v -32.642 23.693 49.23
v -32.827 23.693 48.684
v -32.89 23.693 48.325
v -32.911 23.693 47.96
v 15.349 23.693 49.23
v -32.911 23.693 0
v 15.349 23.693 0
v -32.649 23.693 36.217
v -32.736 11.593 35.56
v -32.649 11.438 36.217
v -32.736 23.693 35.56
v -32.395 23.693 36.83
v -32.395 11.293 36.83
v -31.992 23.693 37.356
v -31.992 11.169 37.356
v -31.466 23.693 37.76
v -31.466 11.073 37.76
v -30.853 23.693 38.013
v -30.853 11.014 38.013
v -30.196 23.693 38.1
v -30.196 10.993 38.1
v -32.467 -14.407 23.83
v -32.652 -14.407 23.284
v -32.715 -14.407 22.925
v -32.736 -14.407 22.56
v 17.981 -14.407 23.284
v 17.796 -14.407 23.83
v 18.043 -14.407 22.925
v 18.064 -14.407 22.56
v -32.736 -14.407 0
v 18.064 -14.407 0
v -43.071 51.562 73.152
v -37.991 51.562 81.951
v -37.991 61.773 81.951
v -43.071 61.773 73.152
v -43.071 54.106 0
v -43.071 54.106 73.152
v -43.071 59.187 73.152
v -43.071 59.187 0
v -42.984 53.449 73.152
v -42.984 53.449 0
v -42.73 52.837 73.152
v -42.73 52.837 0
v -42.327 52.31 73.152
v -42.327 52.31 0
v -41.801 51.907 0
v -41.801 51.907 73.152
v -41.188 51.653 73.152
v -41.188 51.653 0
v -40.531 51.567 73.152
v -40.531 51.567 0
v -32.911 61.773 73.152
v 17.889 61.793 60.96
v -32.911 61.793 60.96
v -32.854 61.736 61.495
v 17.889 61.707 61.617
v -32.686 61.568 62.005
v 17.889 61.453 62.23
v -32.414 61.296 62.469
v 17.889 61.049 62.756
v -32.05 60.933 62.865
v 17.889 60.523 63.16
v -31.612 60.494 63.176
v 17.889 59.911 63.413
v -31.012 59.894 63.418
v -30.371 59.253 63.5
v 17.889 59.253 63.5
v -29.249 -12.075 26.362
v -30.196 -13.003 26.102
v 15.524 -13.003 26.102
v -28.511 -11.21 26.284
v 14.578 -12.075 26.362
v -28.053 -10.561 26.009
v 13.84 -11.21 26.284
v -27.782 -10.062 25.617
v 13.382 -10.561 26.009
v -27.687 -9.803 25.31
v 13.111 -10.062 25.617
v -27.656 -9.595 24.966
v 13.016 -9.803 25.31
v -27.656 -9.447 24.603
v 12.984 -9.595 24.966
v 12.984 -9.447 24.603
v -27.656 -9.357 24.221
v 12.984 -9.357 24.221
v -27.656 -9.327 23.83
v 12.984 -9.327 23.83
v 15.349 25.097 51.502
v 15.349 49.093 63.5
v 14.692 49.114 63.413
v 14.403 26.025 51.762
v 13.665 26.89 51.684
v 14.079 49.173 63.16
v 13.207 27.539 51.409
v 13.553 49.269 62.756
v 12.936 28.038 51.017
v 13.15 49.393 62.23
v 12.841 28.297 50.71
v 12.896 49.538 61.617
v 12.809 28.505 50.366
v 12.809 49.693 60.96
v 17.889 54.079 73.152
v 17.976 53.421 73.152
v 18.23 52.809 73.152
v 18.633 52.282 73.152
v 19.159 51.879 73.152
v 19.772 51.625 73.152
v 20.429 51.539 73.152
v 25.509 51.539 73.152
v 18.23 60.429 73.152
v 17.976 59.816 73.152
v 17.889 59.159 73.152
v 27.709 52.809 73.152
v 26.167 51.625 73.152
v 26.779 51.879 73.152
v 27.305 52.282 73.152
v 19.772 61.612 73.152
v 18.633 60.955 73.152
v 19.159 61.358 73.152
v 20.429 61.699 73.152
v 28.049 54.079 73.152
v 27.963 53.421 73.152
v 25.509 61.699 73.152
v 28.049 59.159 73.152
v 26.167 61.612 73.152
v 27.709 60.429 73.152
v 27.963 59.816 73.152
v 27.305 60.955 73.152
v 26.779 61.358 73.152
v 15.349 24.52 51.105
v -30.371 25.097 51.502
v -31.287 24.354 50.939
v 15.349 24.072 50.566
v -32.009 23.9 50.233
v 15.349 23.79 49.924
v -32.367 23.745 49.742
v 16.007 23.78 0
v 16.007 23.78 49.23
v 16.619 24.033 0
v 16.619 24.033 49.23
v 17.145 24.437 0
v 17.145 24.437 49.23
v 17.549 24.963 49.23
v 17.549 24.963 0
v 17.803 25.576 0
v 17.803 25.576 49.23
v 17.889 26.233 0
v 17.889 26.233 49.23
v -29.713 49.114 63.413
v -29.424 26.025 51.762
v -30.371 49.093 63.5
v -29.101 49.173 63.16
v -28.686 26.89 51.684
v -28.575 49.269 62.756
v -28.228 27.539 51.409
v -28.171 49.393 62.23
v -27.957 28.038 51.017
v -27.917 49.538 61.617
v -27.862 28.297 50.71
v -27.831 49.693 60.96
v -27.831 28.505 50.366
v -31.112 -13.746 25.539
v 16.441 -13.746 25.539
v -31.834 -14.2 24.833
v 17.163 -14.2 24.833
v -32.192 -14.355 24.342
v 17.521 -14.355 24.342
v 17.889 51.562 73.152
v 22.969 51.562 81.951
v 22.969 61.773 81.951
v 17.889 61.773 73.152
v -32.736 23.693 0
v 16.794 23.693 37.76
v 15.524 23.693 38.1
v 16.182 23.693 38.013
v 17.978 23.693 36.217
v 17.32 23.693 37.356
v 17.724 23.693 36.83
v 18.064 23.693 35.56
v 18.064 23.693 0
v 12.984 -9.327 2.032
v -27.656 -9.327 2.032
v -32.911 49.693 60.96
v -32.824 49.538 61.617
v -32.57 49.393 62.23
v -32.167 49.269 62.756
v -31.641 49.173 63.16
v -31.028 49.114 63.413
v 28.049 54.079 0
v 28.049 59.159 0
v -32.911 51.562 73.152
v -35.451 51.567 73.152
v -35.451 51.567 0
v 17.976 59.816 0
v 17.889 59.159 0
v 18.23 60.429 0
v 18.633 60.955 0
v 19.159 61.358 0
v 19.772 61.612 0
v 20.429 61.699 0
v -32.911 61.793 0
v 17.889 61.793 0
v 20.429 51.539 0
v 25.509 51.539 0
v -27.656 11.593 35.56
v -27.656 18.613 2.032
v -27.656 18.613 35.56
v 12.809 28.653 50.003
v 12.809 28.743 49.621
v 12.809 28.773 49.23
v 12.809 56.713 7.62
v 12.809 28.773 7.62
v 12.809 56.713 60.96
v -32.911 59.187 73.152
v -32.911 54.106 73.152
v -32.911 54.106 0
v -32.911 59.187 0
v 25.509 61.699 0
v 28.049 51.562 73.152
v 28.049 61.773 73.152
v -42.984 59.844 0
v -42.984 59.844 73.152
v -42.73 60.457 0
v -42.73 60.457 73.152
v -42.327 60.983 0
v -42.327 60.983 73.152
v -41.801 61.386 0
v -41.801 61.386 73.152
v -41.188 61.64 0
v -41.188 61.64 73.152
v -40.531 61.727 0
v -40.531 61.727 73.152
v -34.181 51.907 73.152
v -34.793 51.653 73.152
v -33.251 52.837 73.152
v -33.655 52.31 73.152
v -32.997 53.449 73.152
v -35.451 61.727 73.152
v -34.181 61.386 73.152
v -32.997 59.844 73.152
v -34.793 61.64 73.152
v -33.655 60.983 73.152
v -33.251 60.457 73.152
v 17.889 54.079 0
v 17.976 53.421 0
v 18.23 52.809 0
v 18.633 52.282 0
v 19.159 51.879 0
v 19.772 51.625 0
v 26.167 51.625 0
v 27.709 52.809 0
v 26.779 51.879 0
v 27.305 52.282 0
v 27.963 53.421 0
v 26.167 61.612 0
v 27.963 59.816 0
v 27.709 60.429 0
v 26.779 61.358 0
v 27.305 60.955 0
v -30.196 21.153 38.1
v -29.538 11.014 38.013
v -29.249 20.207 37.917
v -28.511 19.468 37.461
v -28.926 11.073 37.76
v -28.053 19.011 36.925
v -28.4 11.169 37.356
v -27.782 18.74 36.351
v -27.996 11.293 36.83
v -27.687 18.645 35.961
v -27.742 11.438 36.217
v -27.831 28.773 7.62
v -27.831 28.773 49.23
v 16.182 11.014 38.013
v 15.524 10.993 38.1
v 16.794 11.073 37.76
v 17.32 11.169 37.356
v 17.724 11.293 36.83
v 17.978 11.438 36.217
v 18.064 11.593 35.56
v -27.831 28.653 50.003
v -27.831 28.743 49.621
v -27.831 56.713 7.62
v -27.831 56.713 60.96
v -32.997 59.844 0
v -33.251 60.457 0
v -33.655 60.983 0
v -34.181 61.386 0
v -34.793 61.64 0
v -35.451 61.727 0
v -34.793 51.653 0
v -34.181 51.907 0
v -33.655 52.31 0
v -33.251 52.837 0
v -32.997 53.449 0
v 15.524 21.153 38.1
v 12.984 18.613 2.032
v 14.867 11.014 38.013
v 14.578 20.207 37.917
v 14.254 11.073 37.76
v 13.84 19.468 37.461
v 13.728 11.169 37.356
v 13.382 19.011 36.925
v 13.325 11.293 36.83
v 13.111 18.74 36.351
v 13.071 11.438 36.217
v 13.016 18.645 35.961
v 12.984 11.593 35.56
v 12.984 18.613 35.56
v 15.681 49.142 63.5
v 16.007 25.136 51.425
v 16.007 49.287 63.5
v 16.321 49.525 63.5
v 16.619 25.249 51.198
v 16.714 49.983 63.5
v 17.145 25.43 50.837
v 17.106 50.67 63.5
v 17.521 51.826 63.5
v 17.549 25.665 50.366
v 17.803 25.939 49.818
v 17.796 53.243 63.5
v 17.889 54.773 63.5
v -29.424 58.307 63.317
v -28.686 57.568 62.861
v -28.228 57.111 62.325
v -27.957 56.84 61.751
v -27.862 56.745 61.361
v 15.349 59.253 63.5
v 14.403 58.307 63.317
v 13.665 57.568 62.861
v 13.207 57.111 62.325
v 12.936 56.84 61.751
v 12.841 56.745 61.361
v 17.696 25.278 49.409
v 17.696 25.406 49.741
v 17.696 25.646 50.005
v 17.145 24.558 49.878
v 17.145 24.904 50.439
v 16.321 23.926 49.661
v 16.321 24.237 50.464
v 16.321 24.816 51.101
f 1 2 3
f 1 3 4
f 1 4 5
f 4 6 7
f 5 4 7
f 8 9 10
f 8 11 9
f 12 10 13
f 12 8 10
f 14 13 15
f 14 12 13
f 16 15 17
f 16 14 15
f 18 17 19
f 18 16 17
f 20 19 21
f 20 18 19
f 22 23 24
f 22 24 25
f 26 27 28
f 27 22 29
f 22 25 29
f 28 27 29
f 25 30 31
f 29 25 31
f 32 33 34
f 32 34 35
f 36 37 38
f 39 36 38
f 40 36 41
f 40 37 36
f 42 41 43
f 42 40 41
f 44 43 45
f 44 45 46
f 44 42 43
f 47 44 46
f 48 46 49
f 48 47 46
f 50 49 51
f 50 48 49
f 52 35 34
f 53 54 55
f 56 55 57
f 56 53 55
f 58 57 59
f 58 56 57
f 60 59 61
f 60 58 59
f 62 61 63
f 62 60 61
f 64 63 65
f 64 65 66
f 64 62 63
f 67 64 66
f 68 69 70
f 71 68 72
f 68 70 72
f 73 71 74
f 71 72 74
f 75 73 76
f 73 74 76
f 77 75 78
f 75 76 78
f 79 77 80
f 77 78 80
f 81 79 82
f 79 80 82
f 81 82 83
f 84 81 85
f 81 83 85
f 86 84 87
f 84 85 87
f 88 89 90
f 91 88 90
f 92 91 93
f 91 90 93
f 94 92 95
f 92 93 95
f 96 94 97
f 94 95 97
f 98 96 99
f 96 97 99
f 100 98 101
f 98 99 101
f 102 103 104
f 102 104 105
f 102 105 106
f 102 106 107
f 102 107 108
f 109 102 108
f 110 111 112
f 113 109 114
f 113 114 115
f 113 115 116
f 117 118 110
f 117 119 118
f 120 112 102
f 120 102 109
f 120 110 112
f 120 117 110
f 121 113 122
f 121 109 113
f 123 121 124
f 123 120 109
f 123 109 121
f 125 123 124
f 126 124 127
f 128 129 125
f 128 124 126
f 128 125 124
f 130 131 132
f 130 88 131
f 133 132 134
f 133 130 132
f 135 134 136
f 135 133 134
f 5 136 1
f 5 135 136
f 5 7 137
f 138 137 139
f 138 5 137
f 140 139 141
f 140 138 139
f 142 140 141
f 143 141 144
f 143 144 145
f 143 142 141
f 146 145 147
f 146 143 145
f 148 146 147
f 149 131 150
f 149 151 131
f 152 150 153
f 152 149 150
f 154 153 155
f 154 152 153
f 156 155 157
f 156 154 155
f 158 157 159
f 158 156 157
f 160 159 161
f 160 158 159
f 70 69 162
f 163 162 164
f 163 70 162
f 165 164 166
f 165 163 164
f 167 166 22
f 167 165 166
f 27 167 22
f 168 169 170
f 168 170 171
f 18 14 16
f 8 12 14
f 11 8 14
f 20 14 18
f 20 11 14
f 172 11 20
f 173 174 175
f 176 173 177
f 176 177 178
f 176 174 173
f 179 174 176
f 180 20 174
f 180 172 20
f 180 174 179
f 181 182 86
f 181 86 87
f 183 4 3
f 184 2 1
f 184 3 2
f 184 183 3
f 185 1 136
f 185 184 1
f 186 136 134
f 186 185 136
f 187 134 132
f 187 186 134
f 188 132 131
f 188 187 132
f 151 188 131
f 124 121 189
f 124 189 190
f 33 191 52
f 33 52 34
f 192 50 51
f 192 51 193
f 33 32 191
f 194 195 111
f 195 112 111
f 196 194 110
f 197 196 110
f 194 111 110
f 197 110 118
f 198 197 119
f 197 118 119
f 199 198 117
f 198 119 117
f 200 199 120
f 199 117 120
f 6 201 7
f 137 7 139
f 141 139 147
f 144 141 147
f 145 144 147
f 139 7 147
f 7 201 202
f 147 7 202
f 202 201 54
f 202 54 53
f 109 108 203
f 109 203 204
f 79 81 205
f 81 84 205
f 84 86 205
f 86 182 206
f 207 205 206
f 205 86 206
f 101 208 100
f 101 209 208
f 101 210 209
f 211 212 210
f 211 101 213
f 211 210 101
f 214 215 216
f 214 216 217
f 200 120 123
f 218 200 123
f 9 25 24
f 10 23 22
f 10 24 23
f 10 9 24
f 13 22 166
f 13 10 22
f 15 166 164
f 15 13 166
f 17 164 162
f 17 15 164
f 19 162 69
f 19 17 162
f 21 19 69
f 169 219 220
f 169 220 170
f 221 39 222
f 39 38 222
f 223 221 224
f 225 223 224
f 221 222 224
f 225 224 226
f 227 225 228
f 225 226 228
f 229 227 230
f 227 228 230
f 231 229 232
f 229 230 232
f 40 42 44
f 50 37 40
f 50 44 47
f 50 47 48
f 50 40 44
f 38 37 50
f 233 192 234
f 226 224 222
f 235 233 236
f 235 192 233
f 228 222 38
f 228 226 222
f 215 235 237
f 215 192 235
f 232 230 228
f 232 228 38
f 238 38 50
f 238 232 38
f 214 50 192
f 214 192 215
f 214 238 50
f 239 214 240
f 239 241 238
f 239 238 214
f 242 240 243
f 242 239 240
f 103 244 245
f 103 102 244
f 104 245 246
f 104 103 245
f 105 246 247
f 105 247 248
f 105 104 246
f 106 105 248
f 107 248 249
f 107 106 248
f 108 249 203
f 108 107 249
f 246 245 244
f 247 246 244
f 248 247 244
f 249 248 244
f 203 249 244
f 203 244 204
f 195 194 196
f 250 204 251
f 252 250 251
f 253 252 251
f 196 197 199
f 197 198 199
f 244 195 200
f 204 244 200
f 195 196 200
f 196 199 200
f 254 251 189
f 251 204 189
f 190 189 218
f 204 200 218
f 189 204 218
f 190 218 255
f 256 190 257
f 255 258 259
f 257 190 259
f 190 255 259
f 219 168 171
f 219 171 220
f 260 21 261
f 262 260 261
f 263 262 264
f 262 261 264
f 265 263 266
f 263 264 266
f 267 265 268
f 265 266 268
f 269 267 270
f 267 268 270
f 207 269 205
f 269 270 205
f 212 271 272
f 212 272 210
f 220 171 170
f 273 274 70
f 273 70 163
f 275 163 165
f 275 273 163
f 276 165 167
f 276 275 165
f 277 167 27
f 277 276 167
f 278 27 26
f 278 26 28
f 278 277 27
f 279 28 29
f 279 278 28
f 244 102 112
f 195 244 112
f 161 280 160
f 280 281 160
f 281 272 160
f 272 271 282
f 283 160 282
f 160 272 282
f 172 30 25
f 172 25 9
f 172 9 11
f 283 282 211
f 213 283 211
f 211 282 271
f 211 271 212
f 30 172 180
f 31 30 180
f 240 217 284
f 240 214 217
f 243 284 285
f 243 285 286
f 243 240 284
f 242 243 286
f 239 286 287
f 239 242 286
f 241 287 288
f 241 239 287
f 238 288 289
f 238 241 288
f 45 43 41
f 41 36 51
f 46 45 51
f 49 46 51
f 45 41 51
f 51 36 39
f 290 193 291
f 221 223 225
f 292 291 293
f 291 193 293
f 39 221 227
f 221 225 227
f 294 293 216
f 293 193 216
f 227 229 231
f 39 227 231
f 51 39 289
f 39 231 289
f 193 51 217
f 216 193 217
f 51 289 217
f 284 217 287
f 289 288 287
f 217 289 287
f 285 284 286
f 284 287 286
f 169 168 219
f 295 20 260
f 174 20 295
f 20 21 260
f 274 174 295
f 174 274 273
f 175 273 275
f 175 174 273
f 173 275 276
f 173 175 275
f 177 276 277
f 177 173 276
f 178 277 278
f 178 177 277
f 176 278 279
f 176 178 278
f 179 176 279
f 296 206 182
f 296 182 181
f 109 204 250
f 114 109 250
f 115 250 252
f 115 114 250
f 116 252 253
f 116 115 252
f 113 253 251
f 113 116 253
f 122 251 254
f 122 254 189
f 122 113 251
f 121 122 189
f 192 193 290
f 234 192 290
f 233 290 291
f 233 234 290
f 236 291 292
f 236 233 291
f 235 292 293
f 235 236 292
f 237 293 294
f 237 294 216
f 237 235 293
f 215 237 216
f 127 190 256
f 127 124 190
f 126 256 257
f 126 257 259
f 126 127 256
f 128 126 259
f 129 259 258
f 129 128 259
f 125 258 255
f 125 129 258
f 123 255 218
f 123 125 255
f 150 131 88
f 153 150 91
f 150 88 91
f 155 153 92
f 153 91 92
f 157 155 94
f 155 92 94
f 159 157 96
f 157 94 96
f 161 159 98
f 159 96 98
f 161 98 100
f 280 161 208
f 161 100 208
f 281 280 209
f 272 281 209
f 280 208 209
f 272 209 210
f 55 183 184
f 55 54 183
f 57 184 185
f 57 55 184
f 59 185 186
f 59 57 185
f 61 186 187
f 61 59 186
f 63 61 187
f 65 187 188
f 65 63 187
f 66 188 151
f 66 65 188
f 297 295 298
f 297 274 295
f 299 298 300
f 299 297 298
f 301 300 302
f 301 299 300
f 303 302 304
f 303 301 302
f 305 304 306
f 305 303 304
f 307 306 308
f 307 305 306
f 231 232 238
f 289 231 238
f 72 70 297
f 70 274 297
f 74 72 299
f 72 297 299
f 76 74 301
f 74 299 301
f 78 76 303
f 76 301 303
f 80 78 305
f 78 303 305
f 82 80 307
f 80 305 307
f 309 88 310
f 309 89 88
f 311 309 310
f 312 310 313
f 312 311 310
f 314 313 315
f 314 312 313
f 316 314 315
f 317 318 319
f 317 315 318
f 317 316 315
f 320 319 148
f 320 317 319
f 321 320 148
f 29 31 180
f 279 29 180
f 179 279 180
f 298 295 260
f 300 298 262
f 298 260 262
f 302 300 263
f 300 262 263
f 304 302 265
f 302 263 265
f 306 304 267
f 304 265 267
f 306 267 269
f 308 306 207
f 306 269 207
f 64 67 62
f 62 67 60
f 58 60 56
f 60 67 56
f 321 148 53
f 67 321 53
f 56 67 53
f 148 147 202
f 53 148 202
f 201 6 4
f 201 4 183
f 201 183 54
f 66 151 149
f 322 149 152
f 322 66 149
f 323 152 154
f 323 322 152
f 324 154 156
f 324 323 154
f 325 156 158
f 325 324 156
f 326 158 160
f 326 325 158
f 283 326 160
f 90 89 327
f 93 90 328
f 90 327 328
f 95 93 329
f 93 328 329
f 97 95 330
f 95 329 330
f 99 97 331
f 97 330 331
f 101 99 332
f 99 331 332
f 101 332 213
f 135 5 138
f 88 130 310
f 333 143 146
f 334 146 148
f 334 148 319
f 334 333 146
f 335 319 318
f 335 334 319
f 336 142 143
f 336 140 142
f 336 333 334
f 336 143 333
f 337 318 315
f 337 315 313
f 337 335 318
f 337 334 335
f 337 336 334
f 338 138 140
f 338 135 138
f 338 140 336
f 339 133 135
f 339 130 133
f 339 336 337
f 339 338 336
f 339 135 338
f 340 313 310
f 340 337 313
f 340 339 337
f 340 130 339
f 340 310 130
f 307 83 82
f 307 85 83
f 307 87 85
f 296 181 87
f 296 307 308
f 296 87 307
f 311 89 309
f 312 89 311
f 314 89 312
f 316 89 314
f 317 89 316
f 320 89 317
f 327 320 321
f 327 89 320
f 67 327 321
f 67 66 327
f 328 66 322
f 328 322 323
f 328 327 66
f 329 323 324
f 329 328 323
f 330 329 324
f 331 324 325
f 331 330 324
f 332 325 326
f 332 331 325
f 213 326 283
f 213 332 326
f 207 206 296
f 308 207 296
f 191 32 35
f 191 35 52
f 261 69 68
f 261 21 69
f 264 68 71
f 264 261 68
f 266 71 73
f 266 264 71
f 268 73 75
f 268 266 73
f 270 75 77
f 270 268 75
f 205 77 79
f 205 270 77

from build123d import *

# Parameters (mm, degrees)
F0_W           = 50.8
F0_H           = 38.1
F4_DEPTH       = 63.5
F1_W           = 50.8
F1_H           = 38.1
F5_DEPTH       = 38.1
F6_START       = 7.62
F2_W           = 40.64
F2_H           = 27.94
F6_DEPTH       = 55.88
F7_START       = 2.032
F3_W           = 40.64
F3_H           = 27.94
F7_DEPTH       = 59.182
F8_W           = 10.16
F8_H           = 10.16
F9_DEPTH       = 73.152
F11_START      = -51.562
F11_DEPTH      = 10.2108
F12_T1_DEPTH   = 182.3633067884
F12_2_T1_DEPTH = 182.3633067884
F13_R          = 2.53999
F13_2_R        = 2.53999
F13_3_R        = 2.53999
F13_4_R        = 2.53999


# Not quite as in the source:
# - a fillet or chamfer that OpenCascade refuses, or shapes differently, is made with other operations: its cross-section is extruded or revolved along the edge and cut away or added
# - a fillet or chamfer is up to 0.001 mm smaller than in the source, because OpenCascade refuses the exact size


with BuildPart() as f4:
    # F0 (on Top) → F4 (new body)
    with BuildSketch(Plane.XY):
        with Locations((-7.5105691367, 42.7431184798)):
            Rectangle(F0_W, F0_H)
    extrude(amount=F4_DEPTH)

    # F2 (on Top) → F6 (cut)
    with BuildSketch(Plane.XY.offset(F6_START)):
        with Locations((-7.5105691367, 42.7431184798)):
            Rectangle(F2_W, F2_H)
    extrude(amount=F6_DEPTH, mode=Mode.SUBTRACT)

    # F12: chamfer of 25.4 x 12.7 on 1 edges, made by hand

    # F12_s2 → F12_t1 (cut)
    with BuildSketch(Plane.YZ.offset(-98.6922225309)):
        Polygon((23.6931184798, 50.8), (49.0931184798, 63.5), (23.6931184798, 63.5), align=None)
    extrude(amount=F12_T1_DEPTH, mode=Mode.SUBTRACT)

    # F13 (radius 2.54 in the source; OpenCascade refuses exactly that, so slightly less here)
    f13_edges = [f4.edges().sort_by_distance(p)[0] for p in [
        (-7.510569, 28.773118, 53.34),
        (-27.830569, 38.933118, 58.42),
        (-27.830569, 52.903118, 63.5),
        (-7.510569, 56.713118, 63.5),
        (12.809431, 52.903118, 63.5),
        (12.809431, 38.933118, 58.42),
        (-32.910569, 36.393118, 57.15),
        (-7.510569, 61.793118, 63.5),
        (17.889431, 36.393118, 57.15),
        (-7.510569, 23.693118, 50.8),
        (-32.910569, 55.443118, 63.5),
        (17.889431, 23.693118, 25.4),
    ]]
    fillet(f13_edges, radius=F13_R)


with BuildPart() as f5:
    # F1 (on Top) → F5 (new body)
    with BuildSketch(Plane.XY):
        with Locations((-7.3355720048, 4.6431184798)):
            Rectangle(F1_W, F1_H)
    extrude(amount=F5_DEPTH)

    # F3 (on Top) → F7 (cut)
    with BuildSketch(Plane.XY.offset(F7_START)):
        with Locations((-7.3355720048, 4.6431184798)):
            Rectangle(F3_W, F3_H)
    extrude(amount=F7_DEPTH, mode=Mode.SUBTRACT)

    # F12#2: chamfer of 25.4 x 12.7 on 1 edges, made by hand

    # F12_2_s2 → F12_2_t1 (cut)
    with BuildSketch(Plane.YZ.offset(-98.517225399)):
        Polygon((-14.4068815202, 25.4), (10.9931184798, 38.1), (-14.4068815202, 38.1), align=None)
    extrude(amount=F12_2_T1_DEPTH, mode=Mode.SUBTRACT)

    # F13#2 (radius 2.54 in the source; OpenCascade refuses exactly that, so slightly less here)
    f13_2_edges = [f5.edges().sort_by_distance(p)[0] for p in [
        (-7.335572, 18.613118, 38.1),
        (-27.655572, 14.803118, 38.1),
        (-27.655572, 0.833118, 33.02),
        (12.984428, 0.833118, 33.02),
        (12.984428, 14.803118, 38.1),
        (-7.335572, -9.326882, 27.94),
        (18.064428, 17.343118, 38.1),
        (18.064428, -1.706882, 31.75),
        (-7.335572, -14.406882, 25.4),
        (-32.735572, -1.706882, 31.75),
        (-32.735572, 17.343118, 38.1),
    ]]
    fillet(f13_2_edges, radius=F13_2_R)


with BuildPart() as f9:
    # F8 (on Top) → F9 (new body)
    with BuildSketch(Plane.XY):
        with Locations((-37.9905691367, 56.6465079886)):
            Rectangle(F8_W, F8_H)
    extrude(amount=F9_DEPTH)

    # F13#3 (radius 2.54 in the source; OpenCascade refuses exactly that, so slightly less here)
    f13_3_edges = [f9.edges().sort_by_distance(p)[0] for p in [
        (-43.070569, 51.566508, 36.576),
        (-43.070569, 61.726508, 36.576),
        (-32.910569, 61.726508, 36.576),
        (-32.910569, 51.566508, 36.576),
    ]]
    fillet(f13_3_edges, radius=F13_3_R)


with BuildPart() as f9b:
    # F8 (on Top) → F9, piece 2 (new body)
    with BuildSketch(Plane.XY):
        with Locations((22.9694308633, 56.6185530889)):
            Rectangle(F8_W, F8_H)
    extrude(amount=F9_DEPTH)

    # F13#4 (radius 2.54 in the source; OpenCascade refuses exactly that, so slightly less here)
    f13_4_edges = [f9b.edges().sort_by_distance(p)[0] for p in [
        (28.049431, 61.698553, 36.576),
        (17.889431, 51.538553, 36.576),
        (28.049431, 51.538553, 36.576),
        (17.889431, 61.698553, 36.576),
    ]]
    fillet(f13_4_edges, radius=F13_4_R)


with BuildPart() as f11:
    # F10 (on Front) → F11 (new body)
    with BuildSketch(Plane.XZ.offset(F11_START)):
        Polygon((-37.9905691367, 81.9508181024), (-43.0705691367, 73.152), (-32.9105691367, 73.152), align=None)
    extrude(amount=-F11_DEPTH)


with BuildPart() as f11b:
    # F10 (on Front) → F11, piece 2 (new body)
    with BuildSketch(Plane.XZ.offset(F11_START)):
        Polygon((22.9694308633, 81.9508181024), (17.8894308633, 73.152), (28.0494308633, 73.152), align=None)
    extrude(amount=-F11_DEPTH)


solid = Compound([f4.part, f5.part, f9.part, f9b.part, f11.part, f11b.part])
